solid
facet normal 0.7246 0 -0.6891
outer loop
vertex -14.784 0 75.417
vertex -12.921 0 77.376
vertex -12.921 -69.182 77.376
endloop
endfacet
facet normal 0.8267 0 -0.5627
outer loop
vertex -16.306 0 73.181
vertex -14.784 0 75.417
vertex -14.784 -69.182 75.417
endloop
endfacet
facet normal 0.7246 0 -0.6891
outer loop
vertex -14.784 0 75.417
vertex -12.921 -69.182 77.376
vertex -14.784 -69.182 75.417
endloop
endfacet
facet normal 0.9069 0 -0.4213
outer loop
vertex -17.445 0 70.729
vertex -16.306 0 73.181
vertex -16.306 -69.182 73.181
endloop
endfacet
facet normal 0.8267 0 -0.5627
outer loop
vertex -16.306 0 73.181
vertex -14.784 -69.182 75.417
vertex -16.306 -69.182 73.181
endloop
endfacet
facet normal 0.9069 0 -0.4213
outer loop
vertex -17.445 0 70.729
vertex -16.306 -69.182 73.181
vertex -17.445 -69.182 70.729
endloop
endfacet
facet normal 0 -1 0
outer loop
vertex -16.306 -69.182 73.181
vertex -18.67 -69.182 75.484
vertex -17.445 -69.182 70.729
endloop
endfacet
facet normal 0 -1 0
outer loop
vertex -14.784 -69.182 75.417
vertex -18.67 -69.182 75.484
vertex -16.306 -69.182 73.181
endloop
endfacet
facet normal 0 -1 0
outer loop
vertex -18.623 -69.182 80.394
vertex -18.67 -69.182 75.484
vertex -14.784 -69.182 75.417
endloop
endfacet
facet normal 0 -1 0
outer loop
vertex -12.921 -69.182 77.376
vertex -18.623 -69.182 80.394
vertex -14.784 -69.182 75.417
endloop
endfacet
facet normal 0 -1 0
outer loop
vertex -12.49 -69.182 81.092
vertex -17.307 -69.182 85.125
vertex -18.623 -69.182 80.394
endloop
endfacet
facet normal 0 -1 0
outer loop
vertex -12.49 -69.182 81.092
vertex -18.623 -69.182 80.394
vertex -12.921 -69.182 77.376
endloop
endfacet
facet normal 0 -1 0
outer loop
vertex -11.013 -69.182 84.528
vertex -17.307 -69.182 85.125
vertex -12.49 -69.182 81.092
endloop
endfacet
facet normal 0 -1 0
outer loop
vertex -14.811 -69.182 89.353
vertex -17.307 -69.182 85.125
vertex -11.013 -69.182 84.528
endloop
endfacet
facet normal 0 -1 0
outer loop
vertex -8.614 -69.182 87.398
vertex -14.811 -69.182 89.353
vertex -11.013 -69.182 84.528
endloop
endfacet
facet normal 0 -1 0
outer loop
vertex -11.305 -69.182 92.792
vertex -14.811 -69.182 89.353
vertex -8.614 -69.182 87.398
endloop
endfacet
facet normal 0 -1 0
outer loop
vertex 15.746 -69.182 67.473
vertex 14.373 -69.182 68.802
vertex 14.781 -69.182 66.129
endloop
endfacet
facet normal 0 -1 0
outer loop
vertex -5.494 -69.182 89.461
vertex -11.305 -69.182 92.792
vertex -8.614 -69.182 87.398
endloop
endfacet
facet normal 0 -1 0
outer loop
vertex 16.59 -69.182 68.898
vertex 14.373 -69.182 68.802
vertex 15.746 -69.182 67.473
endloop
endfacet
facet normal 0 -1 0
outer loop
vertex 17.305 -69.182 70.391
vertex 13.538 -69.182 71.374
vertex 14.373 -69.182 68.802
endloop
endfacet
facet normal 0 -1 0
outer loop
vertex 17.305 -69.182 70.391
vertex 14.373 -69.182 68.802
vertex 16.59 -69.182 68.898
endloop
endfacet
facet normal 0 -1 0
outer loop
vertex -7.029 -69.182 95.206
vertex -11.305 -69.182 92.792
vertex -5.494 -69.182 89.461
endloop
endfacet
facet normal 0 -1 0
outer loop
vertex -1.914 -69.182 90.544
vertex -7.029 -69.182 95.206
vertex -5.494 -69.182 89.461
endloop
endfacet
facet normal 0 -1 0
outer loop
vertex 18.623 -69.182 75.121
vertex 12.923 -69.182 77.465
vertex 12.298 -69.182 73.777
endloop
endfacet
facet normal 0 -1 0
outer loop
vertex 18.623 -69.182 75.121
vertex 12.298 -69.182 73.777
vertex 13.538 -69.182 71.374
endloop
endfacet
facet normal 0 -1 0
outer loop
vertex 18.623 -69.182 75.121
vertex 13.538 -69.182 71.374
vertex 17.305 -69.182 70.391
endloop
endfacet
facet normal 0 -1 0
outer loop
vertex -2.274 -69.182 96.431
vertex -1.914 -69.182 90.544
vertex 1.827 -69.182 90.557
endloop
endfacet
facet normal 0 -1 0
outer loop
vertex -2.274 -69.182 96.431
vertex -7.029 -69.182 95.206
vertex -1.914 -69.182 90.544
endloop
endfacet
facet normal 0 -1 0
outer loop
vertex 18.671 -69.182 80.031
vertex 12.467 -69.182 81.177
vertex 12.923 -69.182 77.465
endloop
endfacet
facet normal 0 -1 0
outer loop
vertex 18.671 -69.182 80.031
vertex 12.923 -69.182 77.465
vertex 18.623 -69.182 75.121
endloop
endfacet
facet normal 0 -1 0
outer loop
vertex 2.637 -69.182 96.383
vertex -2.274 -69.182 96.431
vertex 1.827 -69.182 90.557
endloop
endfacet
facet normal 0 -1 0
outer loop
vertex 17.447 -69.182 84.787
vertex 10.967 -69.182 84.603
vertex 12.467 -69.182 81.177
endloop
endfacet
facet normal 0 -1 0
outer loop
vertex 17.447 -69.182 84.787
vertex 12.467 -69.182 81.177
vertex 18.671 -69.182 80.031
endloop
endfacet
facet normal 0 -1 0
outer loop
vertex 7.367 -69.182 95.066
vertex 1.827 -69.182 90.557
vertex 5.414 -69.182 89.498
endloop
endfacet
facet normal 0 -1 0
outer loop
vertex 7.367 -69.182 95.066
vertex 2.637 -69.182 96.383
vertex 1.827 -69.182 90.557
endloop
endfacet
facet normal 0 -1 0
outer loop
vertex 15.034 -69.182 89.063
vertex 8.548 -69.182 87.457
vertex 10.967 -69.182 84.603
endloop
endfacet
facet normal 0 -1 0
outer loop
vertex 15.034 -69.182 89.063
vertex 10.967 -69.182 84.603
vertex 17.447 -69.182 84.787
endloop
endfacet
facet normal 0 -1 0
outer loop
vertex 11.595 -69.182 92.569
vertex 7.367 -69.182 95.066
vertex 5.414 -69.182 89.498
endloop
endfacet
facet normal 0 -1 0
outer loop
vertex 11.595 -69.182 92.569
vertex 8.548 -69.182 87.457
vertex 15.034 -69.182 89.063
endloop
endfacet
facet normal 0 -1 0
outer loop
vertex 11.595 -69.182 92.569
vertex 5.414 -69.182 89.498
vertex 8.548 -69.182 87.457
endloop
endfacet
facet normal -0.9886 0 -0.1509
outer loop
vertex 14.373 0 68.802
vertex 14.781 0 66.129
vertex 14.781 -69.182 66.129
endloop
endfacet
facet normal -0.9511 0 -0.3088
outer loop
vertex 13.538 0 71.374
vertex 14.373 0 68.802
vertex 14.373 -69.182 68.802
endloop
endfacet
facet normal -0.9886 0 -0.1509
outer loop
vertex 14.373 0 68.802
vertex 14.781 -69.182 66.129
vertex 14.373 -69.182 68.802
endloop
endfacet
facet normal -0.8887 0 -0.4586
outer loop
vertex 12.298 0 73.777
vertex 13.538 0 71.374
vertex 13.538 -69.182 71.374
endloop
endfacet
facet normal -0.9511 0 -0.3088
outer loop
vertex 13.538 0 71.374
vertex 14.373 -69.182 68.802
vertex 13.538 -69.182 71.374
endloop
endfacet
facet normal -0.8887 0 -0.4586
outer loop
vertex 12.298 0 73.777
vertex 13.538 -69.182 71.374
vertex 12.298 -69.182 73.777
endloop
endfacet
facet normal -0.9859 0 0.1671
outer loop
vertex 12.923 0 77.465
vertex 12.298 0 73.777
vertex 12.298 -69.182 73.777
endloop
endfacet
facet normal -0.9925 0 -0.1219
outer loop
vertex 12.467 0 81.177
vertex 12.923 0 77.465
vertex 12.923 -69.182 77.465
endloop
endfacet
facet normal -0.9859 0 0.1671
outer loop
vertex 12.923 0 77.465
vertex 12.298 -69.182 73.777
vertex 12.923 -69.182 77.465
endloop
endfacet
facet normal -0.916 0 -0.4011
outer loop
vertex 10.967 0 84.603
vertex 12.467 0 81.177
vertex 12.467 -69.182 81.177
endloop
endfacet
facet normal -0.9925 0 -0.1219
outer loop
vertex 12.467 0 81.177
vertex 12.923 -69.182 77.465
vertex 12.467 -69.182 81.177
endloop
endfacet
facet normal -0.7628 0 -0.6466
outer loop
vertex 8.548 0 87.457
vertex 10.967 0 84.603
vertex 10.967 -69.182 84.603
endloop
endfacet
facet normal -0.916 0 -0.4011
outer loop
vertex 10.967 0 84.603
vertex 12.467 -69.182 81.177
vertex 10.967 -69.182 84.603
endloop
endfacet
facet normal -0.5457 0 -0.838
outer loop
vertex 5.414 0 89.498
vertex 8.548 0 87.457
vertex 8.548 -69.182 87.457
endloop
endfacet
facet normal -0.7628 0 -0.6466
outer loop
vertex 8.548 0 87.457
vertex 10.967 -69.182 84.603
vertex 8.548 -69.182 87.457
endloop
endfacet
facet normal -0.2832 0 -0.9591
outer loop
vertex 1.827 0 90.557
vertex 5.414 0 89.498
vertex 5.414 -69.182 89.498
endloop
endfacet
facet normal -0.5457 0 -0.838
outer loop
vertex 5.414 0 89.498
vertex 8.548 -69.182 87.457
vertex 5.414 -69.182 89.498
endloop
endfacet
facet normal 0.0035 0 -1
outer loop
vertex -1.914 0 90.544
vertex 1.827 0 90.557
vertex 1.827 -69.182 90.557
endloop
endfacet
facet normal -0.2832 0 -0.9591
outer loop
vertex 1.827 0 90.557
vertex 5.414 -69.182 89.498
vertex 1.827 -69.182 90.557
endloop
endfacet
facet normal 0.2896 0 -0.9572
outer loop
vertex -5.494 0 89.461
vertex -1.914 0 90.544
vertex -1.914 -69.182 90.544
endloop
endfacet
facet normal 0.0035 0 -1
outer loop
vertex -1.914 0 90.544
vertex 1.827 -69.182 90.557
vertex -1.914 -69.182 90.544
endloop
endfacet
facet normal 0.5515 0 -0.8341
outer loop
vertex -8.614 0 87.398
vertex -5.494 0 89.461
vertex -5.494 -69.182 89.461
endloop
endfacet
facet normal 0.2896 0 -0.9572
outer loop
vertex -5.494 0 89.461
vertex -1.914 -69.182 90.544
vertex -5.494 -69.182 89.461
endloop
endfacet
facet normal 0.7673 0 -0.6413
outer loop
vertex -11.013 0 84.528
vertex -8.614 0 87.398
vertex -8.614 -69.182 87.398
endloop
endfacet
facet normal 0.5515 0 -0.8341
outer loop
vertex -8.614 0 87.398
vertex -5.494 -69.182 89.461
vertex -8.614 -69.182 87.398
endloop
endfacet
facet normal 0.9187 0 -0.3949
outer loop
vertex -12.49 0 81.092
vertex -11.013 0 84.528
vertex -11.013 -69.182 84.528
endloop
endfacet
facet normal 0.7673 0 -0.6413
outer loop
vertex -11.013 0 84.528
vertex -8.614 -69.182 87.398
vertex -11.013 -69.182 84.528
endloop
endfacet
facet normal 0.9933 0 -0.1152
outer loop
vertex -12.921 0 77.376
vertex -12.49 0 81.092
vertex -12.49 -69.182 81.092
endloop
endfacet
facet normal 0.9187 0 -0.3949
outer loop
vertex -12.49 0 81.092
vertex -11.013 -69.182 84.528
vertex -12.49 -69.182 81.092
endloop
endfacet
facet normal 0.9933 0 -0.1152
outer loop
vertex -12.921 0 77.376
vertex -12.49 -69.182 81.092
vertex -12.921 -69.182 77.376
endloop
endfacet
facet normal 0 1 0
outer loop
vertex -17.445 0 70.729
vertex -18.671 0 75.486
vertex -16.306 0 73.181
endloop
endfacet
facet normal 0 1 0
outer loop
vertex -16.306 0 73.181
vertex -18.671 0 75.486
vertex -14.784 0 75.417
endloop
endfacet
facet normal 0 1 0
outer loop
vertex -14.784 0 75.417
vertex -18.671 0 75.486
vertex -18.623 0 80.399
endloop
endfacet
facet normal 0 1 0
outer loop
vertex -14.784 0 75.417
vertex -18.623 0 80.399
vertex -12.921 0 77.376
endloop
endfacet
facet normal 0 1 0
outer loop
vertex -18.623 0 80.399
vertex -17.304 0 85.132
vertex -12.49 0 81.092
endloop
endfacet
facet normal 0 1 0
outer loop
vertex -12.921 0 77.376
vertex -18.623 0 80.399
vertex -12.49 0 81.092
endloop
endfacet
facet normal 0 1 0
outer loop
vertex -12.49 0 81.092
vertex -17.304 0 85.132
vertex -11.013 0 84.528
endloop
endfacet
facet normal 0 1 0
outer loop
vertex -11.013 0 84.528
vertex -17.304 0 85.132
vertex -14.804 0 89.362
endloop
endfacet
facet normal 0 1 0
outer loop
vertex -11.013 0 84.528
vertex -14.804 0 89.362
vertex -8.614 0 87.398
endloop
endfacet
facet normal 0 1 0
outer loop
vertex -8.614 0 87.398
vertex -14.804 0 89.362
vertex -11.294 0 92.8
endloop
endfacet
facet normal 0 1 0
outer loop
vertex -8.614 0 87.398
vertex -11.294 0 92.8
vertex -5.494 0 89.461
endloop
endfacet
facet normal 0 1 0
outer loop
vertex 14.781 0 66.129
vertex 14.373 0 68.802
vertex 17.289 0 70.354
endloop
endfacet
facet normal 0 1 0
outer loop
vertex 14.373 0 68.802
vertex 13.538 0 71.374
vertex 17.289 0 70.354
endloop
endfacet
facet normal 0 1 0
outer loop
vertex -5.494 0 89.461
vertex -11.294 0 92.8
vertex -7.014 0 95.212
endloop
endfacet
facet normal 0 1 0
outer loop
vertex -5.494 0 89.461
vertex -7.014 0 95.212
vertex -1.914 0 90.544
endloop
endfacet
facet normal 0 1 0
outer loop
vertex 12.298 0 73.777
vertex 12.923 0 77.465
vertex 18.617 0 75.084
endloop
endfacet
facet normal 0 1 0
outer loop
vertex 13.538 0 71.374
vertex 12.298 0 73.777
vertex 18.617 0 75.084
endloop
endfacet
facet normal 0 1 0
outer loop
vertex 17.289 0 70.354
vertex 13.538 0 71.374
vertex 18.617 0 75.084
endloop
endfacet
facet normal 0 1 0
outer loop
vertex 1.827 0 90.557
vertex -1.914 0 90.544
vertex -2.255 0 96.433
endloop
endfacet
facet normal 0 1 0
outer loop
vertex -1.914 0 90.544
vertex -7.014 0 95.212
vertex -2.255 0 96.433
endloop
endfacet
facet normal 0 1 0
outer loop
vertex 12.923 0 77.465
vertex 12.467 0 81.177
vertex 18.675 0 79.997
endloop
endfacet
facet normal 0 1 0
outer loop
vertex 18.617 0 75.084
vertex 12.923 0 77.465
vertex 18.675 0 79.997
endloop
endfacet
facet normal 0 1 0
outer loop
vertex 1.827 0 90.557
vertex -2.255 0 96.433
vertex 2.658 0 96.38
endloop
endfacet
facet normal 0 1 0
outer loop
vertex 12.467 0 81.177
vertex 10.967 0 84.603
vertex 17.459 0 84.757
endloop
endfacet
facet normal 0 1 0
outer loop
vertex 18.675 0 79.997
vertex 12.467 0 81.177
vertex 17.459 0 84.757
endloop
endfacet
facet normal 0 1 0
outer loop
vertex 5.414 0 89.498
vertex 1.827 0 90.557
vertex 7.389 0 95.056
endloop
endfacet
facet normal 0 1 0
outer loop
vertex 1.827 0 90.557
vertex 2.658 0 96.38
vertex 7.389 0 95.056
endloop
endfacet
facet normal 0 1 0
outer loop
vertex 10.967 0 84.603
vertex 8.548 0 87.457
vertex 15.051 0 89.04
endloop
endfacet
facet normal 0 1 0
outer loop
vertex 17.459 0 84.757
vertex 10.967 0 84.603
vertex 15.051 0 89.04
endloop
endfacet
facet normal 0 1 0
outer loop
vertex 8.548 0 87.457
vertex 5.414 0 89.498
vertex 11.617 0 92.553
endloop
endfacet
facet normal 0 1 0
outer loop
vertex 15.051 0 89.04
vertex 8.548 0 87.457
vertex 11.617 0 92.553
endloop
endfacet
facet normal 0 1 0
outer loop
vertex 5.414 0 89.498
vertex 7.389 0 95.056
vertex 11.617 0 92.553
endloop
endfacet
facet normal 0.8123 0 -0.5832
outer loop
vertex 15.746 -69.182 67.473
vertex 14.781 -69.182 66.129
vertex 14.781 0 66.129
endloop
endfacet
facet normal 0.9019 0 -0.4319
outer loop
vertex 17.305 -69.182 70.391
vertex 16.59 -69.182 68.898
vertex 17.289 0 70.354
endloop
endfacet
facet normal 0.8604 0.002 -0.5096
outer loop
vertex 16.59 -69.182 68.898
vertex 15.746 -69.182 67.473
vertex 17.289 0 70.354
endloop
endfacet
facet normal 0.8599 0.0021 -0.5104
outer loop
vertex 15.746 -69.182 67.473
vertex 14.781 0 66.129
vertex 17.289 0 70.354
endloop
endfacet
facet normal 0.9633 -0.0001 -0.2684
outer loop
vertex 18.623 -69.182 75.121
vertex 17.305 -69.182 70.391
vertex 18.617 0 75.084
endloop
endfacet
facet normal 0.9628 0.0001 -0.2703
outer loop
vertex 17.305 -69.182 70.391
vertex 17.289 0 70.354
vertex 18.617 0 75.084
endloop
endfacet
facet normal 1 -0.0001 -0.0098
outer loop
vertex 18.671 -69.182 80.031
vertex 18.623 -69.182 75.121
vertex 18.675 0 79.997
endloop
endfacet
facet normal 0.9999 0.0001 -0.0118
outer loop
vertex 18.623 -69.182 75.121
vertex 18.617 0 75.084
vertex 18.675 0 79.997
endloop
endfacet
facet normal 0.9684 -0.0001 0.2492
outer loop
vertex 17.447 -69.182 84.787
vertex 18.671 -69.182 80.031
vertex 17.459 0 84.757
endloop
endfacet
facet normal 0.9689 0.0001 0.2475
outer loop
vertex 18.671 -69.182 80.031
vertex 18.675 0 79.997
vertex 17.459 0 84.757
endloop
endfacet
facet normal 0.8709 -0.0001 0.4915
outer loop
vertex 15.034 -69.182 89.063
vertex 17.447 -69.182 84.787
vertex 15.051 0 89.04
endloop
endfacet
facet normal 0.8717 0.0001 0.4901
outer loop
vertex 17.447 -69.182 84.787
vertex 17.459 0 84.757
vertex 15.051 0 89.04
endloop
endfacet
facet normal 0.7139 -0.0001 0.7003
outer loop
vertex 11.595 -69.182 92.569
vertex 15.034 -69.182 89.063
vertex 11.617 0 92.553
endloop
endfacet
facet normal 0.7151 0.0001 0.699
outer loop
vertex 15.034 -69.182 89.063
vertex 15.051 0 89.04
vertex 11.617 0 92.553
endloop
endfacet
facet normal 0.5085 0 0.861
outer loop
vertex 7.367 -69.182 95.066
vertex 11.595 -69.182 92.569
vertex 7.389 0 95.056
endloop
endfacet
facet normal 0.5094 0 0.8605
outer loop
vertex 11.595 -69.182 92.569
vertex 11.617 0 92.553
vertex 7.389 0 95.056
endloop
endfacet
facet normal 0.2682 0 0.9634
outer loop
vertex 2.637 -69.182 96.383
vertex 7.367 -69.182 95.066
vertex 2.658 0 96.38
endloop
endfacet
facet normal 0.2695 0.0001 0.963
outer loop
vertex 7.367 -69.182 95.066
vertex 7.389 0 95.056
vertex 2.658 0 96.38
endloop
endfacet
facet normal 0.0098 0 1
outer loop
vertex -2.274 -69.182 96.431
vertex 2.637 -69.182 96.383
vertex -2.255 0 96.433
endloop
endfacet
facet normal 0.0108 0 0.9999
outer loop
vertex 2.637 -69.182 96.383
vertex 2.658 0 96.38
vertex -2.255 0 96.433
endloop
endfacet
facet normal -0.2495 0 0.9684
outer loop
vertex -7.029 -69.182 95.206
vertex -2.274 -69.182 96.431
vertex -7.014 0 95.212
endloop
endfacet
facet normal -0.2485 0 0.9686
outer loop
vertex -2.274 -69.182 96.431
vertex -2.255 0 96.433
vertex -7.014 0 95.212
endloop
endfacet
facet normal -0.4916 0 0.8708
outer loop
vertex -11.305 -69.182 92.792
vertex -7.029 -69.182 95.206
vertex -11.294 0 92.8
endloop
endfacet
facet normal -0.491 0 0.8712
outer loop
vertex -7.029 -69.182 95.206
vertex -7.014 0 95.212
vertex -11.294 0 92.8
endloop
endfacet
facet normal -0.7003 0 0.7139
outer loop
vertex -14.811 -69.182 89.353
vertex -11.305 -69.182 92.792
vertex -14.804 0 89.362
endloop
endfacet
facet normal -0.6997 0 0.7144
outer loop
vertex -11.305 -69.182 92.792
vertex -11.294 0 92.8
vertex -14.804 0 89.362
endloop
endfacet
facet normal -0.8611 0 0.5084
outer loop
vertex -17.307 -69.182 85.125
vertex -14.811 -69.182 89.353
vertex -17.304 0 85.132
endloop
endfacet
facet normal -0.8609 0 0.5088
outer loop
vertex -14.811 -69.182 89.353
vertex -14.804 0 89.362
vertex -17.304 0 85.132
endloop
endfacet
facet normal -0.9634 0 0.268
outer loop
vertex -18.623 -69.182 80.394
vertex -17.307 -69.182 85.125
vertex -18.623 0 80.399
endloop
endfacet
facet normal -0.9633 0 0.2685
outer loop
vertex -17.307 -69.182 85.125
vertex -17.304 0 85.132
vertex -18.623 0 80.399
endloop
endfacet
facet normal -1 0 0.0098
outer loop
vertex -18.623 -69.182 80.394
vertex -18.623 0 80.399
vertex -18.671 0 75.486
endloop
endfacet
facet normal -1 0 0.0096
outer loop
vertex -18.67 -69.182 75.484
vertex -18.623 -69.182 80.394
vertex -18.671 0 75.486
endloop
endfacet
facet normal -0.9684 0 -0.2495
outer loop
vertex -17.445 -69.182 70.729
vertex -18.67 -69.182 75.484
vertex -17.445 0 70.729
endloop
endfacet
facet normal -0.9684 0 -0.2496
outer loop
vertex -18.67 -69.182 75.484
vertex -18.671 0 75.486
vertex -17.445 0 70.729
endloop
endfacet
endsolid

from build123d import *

# Parameters (mm, degrees)
F0_R     = 18.808676083
F1_DEPTH = 69.1824834794
F2_R     = 12.9265710322
F3_DEPTH = 129.7349091619
F5_DEPTH = 129.6051889658
F6_R     = 16.6484962408
F7_DEPTH = 87.6426827163


with BuildPart() as f1:
    # F0 (on Front) → F1 (new body)
    with BuildSketch(Plane.XZ):
        with Locations((0, 77.7600631118)):
            Circle(F0_R)
    extrude(amount=F1_DEPTH)

    # F2 (on face) → F3 (cut)
    with BuildSketch(Plane.XZ.offset(69.1824834794)):
        with Locations((0, 77.7600631118)):
            Circle(F2_R)
    extrude(amount=-F3_DEPTH, mode=Mode.SUBTRACT)

    # F4 (on face) → F5 (cut)
    with BuildSketch(Plane.XZ.offset(69.1824834794)):
        with BuildLine():
            ThreePointArc((-12.9257110231, 77.6109551043), (0, 64.8334920796), (12.9257110231, 77.6109551043))
            ThreePointArc((12.9257110231, 77.6109551043), (0, 83.0086830497), (-12.9257110231, 77.6109551043))
        make_face()
        with BuildLine():
            ThreePointArc((-17.3048152374, 70.3905539291), (-2.8124051236, 46.8772133943), (18.1751909702, 64.8334920796))
            ThreePointArc((18.1751909702, 64.8334920796), (17.9562786853, 67.6458972031), (17.3048152374, 70.3905539291))
            ThreePointArc((17.3048152374, 70.3905539291), (0, 58.9513870288), (-17.3048152374, 70.3905539291))
        make_face()
    extrude(amount=-F5_DEPTH, mode=Mode.SUBTRACT)

    # F6 (on face) → F7 (cut)
    with BuildSketch(Plane.XZ.offset(69.1824834794)):
        with Locations((-1.8266138414, 64.963199413)):
            Circle(F6_R)
    extrude(amount=-F7_DEPTH, mode=Mode.SUBTRACT)


solid = f1.part
